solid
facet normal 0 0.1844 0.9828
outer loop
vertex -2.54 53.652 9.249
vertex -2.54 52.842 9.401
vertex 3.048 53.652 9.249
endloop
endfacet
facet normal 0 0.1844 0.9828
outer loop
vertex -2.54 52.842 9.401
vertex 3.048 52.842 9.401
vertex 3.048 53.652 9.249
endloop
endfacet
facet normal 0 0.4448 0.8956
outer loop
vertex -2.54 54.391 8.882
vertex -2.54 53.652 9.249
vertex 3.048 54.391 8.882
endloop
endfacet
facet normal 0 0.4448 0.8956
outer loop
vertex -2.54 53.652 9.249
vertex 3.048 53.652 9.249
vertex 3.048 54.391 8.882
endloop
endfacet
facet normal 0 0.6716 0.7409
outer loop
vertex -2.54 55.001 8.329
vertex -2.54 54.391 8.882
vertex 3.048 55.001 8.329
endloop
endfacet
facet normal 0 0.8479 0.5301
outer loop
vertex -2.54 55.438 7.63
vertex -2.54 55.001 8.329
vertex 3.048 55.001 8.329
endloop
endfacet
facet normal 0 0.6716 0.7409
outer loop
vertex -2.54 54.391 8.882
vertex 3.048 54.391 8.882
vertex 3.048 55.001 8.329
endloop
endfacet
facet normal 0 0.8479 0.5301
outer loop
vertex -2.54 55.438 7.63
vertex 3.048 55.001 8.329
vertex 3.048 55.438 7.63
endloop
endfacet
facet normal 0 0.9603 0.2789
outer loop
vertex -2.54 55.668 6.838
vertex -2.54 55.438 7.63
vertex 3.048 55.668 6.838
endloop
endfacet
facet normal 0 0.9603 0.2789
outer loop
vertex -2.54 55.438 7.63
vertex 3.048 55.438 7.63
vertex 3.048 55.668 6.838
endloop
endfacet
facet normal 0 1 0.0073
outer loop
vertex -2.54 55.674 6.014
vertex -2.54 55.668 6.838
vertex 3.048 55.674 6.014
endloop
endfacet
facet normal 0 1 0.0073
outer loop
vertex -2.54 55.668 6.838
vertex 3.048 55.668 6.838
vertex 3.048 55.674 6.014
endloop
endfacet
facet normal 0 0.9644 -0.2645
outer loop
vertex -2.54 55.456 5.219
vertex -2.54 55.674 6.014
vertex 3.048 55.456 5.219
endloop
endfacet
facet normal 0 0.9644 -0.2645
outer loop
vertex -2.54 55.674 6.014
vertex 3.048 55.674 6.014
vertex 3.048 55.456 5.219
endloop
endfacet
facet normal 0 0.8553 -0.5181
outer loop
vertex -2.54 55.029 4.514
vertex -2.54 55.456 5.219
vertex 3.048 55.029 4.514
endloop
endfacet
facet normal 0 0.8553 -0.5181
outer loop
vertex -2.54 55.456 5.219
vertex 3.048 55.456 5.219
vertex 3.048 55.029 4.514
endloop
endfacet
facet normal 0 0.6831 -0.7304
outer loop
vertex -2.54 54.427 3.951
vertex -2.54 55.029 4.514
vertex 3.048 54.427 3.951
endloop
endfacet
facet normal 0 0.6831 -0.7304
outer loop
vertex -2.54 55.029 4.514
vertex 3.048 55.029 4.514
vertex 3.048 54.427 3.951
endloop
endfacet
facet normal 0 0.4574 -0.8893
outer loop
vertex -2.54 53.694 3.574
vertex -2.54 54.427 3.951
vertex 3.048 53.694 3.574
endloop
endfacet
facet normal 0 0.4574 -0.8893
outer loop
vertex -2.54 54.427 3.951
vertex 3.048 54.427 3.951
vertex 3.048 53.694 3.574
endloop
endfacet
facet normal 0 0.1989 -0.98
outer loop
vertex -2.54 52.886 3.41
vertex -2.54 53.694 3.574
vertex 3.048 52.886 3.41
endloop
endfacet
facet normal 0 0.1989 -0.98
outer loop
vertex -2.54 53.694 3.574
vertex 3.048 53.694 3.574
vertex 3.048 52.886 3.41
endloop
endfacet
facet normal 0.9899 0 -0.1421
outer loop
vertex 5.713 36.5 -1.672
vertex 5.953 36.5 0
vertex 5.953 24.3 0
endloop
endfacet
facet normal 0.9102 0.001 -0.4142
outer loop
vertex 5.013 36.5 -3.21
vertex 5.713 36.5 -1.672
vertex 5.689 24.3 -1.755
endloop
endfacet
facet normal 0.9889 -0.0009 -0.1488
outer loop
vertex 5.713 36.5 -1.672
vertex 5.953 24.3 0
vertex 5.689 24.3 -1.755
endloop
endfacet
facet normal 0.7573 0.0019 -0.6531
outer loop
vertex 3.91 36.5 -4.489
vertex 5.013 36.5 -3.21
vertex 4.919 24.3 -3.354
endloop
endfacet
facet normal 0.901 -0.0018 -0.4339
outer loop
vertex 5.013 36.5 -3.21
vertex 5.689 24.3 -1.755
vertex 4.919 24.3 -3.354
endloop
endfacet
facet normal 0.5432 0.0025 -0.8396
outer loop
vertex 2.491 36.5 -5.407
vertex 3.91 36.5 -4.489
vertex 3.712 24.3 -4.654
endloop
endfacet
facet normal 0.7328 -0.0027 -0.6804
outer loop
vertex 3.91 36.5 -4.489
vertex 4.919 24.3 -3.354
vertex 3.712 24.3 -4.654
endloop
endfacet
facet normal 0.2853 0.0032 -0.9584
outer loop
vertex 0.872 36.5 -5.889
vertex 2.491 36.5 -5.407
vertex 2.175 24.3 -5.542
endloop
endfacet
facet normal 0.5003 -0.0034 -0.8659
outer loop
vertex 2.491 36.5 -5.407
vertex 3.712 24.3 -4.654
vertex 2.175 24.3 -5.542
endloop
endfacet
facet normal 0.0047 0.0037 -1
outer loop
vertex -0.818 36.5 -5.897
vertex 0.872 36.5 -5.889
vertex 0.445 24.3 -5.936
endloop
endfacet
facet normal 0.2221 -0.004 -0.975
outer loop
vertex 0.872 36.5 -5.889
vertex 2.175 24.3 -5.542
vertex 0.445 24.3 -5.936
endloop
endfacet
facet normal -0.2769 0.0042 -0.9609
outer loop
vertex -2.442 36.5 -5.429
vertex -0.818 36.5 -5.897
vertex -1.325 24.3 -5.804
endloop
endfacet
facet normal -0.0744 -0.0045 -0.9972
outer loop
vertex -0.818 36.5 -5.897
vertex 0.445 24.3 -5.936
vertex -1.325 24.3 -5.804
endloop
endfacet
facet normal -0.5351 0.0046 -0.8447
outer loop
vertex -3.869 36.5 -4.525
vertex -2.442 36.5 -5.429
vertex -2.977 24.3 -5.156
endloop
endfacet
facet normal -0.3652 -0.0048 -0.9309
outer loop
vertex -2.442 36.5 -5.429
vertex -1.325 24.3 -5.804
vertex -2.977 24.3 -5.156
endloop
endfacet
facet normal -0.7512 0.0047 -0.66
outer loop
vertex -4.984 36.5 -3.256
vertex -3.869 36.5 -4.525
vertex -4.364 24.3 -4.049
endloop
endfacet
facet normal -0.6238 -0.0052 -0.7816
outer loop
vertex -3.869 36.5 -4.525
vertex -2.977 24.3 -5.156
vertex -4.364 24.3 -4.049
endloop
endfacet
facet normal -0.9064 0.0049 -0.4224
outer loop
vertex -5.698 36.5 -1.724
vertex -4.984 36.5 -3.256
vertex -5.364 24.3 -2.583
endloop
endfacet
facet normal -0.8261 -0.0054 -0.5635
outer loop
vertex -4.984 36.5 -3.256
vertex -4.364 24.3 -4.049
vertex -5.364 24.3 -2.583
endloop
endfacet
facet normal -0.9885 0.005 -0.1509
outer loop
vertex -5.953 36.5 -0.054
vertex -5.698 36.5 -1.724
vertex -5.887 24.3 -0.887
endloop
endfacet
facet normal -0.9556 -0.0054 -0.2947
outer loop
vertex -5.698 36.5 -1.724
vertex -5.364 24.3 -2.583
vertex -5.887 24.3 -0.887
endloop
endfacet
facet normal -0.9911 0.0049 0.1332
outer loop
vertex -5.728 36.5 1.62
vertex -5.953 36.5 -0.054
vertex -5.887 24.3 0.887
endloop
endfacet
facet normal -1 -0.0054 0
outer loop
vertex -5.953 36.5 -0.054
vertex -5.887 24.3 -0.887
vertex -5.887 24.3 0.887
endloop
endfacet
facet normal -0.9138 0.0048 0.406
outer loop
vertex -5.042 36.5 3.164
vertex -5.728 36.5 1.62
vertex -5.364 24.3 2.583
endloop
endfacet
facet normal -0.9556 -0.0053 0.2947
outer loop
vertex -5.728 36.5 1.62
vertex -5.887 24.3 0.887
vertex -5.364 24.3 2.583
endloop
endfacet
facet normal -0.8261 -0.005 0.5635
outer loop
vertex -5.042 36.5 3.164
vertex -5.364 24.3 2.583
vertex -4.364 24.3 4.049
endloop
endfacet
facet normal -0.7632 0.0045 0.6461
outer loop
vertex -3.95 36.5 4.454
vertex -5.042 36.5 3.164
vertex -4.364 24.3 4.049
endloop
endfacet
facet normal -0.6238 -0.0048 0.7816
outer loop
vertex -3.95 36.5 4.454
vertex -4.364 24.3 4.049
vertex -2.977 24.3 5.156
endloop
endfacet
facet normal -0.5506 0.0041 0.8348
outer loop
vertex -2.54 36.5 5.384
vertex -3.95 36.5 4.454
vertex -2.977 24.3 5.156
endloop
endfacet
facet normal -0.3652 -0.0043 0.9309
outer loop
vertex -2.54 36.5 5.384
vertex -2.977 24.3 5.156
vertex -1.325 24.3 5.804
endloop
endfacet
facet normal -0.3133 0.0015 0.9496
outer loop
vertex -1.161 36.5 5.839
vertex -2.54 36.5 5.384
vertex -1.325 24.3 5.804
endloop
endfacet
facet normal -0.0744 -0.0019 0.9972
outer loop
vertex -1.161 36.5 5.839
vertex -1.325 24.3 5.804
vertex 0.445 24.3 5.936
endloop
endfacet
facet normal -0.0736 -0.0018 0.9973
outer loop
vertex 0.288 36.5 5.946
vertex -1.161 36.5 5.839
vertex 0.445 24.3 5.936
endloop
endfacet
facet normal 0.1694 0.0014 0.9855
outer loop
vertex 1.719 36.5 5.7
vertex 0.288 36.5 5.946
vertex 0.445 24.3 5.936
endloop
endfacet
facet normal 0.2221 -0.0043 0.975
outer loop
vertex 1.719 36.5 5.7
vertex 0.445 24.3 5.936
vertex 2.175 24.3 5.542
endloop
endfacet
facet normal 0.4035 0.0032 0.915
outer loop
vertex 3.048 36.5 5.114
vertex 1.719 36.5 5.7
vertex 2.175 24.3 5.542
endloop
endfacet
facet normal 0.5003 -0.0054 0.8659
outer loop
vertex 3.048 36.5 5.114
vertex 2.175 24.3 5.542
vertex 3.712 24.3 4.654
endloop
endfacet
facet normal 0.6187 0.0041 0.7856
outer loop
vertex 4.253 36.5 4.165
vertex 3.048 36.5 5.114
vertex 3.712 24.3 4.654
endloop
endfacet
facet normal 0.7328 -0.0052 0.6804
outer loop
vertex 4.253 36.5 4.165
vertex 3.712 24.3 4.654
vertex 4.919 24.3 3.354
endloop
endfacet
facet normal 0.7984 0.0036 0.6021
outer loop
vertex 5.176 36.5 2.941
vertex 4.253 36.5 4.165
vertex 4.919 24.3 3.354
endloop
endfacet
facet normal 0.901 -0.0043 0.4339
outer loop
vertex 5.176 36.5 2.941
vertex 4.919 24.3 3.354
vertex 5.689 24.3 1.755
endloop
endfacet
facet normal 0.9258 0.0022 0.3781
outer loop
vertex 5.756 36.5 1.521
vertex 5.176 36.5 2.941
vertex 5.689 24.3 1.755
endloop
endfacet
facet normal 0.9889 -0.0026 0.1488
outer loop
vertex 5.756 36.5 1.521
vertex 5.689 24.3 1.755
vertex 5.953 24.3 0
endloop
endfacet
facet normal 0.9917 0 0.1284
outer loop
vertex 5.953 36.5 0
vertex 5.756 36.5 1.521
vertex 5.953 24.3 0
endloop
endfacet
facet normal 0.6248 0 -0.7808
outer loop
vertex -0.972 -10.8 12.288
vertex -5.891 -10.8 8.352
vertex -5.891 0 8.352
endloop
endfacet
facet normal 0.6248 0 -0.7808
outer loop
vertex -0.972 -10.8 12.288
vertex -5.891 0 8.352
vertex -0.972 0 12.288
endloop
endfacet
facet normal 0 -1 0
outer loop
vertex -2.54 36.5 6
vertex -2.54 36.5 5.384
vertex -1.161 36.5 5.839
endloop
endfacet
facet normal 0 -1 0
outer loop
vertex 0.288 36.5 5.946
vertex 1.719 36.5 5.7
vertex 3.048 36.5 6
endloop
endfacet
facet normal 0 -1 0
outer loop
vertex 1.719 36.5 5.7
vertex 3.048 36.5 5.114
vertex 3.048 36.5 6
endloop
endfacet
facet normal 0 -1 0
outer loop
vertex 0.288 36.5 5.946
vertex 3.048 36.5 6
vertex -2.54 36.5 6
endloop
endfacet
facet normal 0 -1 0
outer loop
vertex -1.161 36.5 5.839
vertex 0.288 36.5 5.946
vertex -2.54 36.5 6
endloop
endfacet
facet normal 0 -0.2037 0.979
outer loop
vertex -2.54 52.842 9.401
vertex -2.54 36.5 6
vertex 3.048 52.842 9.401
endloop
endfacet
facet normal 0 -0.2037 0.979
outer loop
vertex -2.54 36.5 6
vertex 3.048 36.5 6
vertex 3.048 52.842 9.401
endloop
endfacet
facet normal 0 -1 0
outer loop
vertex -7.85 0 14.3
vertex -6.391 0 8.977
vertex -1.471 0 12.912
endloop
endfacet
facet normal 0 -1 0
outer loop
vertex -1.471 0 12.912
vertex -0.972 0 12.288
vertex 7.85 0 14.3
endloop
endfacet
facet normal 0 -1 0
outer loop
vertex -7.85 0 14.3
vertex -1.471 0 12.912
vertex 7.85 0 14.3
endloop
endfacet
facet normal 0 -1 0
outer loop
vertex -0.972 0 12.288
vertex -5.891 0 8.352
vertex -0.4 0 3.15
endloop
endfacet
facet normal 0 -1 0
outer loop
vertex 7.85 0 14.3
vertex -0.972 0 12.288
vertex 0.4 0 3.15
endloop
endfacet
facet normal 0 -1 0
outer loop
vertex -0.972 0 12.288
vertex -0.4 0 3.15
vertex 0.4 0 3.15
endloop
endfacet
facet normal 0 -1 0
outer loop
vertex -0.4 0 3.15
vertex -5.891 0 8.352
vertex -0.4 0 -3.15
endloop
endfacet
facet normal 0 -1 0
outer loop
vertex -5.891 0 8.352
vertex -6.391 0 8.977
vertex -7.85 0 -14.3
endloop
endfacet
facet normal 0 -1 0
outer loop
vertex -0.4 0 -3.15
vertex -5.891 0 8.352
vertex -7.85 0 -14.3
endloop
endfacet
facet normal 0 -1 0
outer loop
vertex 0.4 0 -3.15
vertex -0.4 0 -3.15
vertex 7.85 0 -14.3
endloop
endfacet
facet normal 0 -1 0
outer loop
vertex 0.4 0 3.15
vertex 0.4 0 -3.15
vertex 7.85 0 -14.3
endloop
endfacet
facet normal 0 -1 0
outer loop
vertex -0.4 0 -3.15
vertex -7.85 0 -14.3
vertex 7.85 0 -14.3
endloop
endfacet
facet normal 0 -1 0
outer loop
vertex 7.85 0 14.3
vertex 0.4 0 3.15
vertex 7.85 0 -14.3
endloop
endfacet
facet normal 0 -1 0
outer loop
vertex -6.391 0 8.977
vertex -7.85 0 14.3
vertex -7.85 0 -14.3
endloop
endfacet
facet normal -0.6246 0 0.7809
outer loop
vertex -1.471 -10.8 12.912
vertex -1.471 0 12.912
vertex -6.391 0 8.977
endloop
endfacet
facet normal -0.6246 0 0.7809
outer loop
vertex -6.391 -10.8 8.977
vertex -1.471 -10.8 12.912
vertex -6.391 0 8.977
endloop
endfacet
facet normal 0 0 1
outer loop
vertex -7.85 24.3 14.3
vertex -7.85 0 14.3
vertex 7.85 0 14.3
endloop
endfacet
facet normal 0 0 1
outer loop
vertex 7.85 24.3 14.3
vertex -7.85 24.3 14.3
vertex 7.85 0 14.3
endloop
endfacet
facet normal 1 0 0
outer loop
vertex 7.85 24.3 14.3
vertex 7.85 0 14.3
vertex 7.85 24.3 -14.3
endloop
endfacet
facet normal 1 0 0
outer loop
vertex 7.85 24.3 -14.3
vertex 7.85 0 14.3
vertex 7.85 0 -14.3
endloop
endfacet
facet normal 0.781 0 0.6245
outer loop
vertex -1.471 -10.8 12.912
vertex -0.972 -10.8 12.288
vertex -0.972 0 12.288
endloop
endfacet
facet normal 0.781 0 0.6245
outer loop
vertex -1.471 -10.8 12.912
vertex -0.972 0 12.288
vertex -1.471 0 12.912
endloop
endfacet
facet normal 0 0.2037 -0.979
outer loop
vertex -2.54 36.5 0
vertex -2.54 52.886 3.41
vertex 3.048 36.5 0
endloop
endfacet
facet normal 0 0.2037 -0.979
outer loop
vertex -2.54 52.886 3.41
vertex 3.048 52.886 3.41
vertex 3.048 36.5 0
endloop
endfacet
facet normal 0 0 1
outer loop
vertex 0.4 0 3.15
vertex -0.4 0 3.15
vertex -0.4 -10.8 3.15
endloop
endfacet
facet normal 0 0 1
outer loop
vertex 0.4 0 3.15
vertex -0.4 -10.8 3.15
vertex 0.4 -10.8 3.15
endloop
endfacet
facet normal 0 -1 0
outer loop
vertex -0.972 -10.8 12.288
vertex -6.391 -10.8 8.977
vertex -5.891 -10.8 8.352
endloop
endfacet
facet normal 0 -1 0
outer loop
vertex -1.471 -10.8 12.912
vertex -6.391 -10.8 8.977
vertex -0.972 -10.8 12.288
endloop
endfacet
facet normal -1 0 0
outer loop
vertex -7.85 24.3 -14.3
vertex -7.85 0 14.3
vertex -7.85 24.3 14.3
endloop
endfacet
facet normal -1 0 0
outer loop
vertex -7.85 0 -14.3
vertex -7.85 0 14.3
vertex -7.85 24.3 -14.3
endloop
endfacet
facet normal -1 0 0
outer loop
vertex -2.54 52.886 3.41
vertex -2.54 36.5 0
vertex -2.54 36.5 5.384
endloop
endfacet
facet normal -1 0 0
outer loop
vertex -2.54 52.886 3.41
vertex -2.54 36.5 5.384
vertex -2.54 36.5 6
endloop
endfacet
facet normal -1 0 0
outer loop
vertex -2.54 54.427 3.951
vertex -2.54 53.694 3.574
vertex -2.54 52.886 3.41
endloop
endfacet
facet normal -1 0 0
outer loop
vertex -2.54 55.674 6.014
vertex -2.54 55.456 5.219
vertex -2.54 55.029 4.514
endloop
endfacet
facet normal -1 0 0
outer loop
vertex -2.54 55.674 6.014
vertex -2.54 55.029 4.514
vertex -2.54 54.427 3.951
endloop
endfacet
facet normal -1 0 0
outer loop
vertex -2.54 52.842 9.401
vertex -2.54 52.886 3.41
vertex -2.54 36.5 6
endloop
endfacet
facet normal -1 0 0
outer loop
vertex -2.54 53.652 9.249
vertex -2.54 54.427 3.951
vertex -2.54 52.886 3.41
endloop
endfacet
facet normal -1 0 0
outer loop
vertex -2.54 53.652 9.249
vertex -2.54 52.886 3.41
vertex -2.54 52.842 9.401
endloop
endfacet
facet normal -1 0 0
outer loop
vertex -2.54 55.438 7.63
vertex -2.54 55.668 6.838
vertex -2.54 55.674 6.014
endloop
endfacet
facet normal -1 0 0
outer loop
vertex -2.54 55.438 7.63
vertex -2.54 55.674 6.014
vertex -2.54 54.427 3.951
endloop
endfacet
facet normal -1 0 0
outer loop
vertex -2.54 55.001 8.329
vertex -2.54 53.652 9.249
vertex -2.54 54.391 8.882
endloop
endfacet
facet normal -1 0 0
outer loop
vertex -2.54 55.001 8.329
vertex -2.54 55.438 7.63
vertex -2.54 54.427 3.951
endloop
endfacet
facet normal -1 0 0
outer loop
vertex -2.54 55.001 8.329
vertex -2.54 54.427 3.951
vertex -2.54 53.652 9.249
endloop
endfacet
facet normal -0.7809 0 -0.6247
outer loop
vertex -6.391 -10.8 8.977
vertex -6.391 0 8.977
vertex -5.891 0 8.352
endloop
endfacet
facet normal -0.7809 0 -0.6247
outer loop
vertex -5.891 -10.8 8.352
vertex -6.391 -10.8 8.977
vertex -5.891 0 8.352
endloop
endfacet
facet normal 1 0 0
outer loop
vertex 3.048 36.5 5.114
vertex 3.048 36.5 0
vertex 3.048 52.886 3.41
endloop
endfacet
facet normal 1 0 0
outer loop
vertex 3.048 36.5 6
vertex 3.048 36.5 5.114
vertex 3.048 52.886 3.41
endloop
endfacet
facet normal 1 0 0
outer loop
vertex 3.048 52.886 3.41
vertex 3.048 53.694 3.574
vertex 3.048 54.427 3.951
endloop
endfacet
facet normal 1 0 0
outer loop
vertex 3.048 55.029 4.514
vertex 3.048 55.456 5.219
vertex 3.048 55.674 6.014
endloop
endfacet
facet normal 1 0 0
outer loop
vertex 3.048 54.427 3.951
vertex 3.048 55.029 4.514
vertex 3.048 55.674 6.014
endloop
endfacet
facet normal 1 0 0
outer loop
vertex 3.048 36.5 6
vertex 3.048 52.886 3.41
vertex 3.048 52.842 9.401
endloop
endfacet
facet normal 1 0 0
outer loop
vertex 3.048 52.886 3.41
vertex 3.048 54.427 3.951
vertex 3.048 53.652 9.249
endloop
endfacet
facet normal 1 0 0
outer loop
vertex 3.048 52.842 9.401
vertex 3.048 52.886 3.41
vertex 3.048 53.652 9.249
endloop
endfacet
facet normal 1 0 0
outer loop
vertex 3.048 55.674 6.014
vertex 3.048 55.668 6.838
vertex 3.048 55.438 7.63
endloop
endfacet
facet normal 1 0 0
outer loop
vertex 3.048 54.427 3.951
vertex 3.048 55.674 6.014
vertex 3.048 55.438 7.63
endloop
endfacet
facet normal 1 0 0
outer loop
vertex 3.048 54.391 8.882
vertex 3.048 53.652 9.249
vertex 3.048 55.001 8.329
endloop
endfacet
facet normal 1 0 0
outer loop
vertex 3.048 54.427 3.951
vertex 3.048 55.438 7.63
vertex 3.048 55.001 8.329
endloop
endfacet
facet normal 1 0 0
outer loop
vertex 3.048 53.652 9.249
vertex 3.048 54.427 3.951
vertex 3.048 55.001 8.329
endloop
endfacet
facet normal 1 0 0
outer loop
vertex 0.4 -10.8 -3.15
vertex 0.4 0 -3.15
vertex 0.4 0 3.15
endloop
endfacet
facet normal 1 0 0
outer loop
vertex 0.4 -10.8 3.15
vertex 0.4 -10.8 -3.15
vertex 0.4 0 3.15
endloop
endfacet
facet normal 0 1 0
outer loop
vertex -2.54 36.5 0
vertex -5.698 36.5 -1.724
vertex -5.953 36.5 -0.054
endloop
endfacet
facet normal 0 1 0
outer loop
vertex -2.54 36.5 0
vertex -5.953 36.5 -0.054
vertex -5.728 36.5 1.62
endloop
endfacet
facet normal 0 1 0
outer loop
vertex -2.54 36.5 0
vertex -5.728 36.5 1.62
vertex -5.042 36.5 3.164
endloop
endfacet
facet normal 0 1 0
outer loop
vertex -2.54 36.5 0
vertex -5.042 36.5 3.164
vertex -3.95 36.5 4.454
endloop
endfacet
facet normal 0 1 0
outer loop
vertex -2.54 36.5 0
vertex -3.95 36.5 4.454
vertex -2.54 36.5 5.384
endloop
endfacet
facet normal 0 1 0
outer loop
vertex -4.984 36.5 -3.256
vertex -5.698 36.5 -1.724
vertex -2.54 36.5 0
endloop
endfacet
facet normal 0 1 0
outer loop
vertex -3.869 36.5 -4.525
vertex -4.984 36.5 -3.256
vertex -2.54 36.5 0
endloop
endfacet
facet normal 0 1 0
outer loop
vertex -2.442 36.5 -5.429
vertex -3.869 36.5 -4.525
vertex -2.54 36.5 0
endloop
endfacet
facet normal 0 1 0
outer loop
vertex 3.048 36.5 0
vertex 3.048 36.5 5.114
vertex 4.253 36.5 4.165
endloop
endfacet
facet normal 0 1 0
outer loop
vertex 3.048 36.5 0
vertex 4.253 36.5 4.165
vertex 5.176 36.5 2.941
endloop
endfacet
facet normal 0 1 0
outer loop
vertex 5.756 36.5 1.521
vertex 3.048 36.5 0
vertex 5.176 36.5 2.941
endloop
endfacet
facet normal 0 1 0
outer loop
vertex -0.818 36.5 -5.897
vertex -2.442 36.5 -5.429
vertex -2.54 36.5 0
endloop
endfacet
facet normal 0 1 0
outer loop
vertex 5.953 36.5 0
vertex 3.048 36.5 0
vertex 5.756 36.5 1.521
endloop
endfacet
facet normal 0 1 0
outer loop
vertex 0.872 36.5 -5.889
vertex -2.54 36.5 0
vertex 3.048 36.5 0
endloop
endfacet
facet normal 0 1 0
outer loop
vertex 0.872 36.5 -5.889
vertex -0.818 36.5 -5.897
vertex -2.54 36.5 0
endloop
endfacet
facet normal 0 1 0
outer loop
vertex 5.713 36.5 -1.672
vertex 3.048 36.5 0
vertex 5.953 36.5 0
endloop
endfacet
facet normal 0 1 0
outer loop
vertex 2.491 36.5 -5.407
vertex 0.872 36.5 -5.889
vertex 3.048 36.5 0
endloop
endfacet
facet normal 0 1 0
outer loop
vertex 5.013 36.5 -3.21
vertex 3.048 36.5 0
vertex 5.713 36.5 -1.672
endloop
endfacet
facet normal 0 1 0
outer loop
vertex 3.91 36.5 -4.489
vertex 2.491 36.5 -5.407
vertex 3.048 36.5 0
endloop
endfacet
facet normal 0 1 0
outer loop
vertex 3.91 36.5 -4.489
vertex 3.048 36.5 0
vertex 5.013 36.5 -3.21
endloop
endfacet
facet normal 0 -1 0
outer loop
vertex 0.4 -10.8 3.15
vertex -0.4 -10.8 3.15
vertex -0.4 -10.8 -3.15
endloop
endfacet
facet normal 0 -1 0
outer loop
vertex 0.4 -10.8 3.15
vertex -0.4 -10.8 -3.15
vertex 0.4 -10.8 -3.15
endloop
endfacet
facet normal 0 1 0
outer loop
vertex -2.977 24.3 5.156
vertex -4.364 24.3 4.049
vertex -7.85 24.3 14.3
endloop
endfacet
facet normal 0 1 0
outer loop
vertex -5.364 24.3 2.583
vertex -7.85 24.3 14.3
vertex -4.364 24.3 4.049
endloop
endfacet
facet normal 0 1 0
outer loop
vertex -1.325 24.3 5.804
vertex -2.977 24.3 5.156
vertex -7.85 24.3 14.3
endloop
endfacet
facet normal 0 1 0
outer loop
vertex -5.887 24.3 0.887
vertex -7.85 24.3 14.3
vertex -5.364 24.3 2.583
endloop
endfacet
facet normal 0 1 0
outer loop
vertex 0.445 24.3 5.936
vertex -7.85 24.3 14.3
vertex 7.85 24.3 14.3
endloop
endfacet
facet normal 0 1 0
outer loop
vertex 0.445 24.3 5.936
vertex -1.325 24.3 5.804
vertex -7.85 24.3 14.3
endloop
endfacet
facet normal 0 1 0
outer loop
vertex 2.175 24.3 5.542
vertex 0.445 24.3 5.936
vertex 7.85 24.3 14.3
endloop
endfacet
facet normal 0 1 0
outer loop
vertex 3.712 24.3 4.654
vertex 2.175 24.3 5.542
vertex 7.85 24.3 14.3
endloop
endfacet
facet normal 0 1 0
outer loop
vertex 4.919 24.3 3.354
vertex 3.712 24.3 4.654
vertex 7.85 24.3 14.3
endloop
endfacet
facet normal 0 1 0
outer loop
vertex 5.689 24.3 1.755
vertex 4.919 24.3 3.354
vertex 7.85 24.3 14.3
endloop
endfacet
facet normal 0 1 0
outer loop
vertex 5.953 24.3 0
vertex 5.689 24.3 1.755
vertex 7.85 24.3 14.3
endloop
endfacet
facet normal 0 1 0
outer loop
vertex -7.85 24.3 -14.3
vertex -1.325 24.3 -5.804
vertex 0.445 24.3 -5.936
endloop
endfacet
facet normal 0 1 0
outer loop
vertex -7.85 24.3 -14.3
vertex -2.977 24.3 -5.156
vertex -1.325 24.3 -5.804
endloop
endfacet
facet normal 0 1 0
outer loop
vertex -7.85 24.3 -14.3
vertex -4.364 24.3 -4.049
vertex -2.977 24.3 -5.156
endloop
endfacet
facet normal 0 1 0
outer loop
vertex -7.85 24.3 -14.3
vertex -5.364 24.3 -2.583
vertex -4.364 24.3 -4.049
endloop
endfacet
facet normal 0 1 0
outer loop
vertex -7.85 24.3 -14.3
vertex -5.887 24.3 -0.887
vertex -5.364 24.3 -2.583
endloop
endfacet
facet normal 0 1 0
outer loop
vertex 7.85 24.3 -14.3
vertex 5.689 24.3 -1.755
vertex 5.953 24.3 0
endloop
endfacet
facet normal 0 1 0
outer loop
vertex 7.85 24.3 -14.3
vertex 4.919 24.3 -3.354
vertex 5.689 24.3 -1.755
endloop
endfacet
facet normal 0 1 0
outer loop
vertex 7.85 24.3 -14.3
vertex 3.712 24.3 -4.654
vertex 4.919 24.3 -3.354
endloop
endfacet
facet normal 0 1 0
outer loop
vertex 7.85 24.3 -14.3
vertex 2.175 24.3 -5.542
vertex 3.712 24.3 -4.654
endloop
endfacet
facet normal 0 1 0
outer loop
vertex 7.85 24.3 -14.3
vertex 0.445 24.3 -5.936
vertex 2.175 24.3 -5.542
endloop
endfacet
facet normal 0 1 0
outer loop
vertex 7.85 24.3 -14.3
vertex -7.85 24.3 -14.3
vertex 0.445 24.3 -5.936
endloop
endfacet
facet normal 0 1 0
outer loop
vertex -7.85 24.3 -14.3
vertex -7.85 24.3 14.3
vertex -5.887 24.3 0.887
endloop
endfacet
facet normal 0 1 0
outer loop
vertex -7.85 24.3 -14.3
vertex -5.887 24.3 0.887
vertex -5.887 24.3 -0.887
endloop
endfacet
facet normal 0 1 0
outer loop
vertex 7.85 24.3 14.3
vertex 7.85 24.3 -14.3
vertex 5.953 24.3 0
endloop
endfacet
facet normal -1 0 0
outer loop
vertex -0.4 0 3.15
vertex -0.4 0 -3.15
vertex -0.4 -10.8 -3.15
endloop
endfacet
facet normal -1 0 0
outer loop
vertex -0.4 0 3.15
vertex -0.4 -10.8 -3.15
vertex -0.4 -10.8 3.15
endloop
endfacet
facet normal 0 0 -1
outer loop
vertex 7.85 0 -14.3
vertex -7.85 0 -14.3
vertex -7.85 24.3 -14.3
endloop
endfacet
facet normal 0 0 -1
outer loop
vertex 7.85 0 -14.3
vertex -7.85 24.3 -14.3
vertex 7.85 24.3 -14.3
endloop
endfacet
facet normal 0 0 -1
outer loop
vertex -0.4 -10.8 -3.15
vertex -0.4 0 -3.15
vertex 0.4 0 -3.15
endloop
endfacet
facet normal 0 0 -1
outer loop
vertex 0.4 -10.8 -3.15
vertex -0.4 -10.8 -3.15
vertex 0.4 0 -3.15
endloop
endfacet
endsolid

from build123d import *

# Parameters (mm, degrees)
SKETCH1_W               = 15.7
SKETCH1_H               = 28.6
BODY_DEPTH              = 24.3
SKETCH2_R               = 5.953125
PANEL_MOUNT_15_32_DEPTH = 12.2
SWITCH_DEPTH            = 3.048
SWITCH_DEPTH_BACK       = 2.54
SKETCH10_W              = 0.8
SKETCH10_H              = 6.3
CONNECTORS_DEPTH        = 10.8


with BuildPart() as part:
    # Sketch1 → Body (new body)
    with BuildSketch(Plane(origin=(0, 0, 0), x_dir=(1, 0, 0), z_dir=(0, 1, 0))):
        Rectangle(SKETCH1_W, SKETCH1_H)
    extrude(amount=BODY_DEPTH)

    # Sketch2 → Panel Mount  15/32 (add)
    with BuildSketch(Plane(origin=(0, 24.3, 0), x_dir=(1, 0, 0), z_dir=(0, 1, 0))):
        Circle(SKETCH2_R)
    extrude(amount=PANEL_MOUNT_15_32_DEPTH)

    # Sketch9 → Switch (add, two sides)
    with BuildSketch(Plane(origin=(0, 0, 0), x_dir=(0, 0, -1), z_dir=(1, 0, 0))) as switch_sk:
        with BuildLine():
            Line((0, 36.5), (-6, 36.5))
            Line((-6, 36.5), (-9.40084725, 52.842068887))
            ThreePointArc((-9.40084725, 52.842068887), (-6.42619484, 55.699919466), (-3.409982549, 52.885966675))
            Line((-3.409982549, 52.885966675), (0, 36.5))
        make_face()
    extrude(amount=SWITCH_DEPTH)
    extrude(switch_sk.sketch, amount=-SWITCH_DEPTH_BACK)

    # Sketch10 → Connectors (add)
    with BuildSketch(Plane.XZ):
        Polygon((-6.390931504, 8.976782117), (-5.891175466, 8.352087069), (-0.971701967, 12.287665869), (-1.471458005, 12.912360916), align=None)
        Rectangle(SKETCH10_W, SKETCH10_H)
    extrude(amount=CONNECTORS_DEPTH)


solid = part.part
